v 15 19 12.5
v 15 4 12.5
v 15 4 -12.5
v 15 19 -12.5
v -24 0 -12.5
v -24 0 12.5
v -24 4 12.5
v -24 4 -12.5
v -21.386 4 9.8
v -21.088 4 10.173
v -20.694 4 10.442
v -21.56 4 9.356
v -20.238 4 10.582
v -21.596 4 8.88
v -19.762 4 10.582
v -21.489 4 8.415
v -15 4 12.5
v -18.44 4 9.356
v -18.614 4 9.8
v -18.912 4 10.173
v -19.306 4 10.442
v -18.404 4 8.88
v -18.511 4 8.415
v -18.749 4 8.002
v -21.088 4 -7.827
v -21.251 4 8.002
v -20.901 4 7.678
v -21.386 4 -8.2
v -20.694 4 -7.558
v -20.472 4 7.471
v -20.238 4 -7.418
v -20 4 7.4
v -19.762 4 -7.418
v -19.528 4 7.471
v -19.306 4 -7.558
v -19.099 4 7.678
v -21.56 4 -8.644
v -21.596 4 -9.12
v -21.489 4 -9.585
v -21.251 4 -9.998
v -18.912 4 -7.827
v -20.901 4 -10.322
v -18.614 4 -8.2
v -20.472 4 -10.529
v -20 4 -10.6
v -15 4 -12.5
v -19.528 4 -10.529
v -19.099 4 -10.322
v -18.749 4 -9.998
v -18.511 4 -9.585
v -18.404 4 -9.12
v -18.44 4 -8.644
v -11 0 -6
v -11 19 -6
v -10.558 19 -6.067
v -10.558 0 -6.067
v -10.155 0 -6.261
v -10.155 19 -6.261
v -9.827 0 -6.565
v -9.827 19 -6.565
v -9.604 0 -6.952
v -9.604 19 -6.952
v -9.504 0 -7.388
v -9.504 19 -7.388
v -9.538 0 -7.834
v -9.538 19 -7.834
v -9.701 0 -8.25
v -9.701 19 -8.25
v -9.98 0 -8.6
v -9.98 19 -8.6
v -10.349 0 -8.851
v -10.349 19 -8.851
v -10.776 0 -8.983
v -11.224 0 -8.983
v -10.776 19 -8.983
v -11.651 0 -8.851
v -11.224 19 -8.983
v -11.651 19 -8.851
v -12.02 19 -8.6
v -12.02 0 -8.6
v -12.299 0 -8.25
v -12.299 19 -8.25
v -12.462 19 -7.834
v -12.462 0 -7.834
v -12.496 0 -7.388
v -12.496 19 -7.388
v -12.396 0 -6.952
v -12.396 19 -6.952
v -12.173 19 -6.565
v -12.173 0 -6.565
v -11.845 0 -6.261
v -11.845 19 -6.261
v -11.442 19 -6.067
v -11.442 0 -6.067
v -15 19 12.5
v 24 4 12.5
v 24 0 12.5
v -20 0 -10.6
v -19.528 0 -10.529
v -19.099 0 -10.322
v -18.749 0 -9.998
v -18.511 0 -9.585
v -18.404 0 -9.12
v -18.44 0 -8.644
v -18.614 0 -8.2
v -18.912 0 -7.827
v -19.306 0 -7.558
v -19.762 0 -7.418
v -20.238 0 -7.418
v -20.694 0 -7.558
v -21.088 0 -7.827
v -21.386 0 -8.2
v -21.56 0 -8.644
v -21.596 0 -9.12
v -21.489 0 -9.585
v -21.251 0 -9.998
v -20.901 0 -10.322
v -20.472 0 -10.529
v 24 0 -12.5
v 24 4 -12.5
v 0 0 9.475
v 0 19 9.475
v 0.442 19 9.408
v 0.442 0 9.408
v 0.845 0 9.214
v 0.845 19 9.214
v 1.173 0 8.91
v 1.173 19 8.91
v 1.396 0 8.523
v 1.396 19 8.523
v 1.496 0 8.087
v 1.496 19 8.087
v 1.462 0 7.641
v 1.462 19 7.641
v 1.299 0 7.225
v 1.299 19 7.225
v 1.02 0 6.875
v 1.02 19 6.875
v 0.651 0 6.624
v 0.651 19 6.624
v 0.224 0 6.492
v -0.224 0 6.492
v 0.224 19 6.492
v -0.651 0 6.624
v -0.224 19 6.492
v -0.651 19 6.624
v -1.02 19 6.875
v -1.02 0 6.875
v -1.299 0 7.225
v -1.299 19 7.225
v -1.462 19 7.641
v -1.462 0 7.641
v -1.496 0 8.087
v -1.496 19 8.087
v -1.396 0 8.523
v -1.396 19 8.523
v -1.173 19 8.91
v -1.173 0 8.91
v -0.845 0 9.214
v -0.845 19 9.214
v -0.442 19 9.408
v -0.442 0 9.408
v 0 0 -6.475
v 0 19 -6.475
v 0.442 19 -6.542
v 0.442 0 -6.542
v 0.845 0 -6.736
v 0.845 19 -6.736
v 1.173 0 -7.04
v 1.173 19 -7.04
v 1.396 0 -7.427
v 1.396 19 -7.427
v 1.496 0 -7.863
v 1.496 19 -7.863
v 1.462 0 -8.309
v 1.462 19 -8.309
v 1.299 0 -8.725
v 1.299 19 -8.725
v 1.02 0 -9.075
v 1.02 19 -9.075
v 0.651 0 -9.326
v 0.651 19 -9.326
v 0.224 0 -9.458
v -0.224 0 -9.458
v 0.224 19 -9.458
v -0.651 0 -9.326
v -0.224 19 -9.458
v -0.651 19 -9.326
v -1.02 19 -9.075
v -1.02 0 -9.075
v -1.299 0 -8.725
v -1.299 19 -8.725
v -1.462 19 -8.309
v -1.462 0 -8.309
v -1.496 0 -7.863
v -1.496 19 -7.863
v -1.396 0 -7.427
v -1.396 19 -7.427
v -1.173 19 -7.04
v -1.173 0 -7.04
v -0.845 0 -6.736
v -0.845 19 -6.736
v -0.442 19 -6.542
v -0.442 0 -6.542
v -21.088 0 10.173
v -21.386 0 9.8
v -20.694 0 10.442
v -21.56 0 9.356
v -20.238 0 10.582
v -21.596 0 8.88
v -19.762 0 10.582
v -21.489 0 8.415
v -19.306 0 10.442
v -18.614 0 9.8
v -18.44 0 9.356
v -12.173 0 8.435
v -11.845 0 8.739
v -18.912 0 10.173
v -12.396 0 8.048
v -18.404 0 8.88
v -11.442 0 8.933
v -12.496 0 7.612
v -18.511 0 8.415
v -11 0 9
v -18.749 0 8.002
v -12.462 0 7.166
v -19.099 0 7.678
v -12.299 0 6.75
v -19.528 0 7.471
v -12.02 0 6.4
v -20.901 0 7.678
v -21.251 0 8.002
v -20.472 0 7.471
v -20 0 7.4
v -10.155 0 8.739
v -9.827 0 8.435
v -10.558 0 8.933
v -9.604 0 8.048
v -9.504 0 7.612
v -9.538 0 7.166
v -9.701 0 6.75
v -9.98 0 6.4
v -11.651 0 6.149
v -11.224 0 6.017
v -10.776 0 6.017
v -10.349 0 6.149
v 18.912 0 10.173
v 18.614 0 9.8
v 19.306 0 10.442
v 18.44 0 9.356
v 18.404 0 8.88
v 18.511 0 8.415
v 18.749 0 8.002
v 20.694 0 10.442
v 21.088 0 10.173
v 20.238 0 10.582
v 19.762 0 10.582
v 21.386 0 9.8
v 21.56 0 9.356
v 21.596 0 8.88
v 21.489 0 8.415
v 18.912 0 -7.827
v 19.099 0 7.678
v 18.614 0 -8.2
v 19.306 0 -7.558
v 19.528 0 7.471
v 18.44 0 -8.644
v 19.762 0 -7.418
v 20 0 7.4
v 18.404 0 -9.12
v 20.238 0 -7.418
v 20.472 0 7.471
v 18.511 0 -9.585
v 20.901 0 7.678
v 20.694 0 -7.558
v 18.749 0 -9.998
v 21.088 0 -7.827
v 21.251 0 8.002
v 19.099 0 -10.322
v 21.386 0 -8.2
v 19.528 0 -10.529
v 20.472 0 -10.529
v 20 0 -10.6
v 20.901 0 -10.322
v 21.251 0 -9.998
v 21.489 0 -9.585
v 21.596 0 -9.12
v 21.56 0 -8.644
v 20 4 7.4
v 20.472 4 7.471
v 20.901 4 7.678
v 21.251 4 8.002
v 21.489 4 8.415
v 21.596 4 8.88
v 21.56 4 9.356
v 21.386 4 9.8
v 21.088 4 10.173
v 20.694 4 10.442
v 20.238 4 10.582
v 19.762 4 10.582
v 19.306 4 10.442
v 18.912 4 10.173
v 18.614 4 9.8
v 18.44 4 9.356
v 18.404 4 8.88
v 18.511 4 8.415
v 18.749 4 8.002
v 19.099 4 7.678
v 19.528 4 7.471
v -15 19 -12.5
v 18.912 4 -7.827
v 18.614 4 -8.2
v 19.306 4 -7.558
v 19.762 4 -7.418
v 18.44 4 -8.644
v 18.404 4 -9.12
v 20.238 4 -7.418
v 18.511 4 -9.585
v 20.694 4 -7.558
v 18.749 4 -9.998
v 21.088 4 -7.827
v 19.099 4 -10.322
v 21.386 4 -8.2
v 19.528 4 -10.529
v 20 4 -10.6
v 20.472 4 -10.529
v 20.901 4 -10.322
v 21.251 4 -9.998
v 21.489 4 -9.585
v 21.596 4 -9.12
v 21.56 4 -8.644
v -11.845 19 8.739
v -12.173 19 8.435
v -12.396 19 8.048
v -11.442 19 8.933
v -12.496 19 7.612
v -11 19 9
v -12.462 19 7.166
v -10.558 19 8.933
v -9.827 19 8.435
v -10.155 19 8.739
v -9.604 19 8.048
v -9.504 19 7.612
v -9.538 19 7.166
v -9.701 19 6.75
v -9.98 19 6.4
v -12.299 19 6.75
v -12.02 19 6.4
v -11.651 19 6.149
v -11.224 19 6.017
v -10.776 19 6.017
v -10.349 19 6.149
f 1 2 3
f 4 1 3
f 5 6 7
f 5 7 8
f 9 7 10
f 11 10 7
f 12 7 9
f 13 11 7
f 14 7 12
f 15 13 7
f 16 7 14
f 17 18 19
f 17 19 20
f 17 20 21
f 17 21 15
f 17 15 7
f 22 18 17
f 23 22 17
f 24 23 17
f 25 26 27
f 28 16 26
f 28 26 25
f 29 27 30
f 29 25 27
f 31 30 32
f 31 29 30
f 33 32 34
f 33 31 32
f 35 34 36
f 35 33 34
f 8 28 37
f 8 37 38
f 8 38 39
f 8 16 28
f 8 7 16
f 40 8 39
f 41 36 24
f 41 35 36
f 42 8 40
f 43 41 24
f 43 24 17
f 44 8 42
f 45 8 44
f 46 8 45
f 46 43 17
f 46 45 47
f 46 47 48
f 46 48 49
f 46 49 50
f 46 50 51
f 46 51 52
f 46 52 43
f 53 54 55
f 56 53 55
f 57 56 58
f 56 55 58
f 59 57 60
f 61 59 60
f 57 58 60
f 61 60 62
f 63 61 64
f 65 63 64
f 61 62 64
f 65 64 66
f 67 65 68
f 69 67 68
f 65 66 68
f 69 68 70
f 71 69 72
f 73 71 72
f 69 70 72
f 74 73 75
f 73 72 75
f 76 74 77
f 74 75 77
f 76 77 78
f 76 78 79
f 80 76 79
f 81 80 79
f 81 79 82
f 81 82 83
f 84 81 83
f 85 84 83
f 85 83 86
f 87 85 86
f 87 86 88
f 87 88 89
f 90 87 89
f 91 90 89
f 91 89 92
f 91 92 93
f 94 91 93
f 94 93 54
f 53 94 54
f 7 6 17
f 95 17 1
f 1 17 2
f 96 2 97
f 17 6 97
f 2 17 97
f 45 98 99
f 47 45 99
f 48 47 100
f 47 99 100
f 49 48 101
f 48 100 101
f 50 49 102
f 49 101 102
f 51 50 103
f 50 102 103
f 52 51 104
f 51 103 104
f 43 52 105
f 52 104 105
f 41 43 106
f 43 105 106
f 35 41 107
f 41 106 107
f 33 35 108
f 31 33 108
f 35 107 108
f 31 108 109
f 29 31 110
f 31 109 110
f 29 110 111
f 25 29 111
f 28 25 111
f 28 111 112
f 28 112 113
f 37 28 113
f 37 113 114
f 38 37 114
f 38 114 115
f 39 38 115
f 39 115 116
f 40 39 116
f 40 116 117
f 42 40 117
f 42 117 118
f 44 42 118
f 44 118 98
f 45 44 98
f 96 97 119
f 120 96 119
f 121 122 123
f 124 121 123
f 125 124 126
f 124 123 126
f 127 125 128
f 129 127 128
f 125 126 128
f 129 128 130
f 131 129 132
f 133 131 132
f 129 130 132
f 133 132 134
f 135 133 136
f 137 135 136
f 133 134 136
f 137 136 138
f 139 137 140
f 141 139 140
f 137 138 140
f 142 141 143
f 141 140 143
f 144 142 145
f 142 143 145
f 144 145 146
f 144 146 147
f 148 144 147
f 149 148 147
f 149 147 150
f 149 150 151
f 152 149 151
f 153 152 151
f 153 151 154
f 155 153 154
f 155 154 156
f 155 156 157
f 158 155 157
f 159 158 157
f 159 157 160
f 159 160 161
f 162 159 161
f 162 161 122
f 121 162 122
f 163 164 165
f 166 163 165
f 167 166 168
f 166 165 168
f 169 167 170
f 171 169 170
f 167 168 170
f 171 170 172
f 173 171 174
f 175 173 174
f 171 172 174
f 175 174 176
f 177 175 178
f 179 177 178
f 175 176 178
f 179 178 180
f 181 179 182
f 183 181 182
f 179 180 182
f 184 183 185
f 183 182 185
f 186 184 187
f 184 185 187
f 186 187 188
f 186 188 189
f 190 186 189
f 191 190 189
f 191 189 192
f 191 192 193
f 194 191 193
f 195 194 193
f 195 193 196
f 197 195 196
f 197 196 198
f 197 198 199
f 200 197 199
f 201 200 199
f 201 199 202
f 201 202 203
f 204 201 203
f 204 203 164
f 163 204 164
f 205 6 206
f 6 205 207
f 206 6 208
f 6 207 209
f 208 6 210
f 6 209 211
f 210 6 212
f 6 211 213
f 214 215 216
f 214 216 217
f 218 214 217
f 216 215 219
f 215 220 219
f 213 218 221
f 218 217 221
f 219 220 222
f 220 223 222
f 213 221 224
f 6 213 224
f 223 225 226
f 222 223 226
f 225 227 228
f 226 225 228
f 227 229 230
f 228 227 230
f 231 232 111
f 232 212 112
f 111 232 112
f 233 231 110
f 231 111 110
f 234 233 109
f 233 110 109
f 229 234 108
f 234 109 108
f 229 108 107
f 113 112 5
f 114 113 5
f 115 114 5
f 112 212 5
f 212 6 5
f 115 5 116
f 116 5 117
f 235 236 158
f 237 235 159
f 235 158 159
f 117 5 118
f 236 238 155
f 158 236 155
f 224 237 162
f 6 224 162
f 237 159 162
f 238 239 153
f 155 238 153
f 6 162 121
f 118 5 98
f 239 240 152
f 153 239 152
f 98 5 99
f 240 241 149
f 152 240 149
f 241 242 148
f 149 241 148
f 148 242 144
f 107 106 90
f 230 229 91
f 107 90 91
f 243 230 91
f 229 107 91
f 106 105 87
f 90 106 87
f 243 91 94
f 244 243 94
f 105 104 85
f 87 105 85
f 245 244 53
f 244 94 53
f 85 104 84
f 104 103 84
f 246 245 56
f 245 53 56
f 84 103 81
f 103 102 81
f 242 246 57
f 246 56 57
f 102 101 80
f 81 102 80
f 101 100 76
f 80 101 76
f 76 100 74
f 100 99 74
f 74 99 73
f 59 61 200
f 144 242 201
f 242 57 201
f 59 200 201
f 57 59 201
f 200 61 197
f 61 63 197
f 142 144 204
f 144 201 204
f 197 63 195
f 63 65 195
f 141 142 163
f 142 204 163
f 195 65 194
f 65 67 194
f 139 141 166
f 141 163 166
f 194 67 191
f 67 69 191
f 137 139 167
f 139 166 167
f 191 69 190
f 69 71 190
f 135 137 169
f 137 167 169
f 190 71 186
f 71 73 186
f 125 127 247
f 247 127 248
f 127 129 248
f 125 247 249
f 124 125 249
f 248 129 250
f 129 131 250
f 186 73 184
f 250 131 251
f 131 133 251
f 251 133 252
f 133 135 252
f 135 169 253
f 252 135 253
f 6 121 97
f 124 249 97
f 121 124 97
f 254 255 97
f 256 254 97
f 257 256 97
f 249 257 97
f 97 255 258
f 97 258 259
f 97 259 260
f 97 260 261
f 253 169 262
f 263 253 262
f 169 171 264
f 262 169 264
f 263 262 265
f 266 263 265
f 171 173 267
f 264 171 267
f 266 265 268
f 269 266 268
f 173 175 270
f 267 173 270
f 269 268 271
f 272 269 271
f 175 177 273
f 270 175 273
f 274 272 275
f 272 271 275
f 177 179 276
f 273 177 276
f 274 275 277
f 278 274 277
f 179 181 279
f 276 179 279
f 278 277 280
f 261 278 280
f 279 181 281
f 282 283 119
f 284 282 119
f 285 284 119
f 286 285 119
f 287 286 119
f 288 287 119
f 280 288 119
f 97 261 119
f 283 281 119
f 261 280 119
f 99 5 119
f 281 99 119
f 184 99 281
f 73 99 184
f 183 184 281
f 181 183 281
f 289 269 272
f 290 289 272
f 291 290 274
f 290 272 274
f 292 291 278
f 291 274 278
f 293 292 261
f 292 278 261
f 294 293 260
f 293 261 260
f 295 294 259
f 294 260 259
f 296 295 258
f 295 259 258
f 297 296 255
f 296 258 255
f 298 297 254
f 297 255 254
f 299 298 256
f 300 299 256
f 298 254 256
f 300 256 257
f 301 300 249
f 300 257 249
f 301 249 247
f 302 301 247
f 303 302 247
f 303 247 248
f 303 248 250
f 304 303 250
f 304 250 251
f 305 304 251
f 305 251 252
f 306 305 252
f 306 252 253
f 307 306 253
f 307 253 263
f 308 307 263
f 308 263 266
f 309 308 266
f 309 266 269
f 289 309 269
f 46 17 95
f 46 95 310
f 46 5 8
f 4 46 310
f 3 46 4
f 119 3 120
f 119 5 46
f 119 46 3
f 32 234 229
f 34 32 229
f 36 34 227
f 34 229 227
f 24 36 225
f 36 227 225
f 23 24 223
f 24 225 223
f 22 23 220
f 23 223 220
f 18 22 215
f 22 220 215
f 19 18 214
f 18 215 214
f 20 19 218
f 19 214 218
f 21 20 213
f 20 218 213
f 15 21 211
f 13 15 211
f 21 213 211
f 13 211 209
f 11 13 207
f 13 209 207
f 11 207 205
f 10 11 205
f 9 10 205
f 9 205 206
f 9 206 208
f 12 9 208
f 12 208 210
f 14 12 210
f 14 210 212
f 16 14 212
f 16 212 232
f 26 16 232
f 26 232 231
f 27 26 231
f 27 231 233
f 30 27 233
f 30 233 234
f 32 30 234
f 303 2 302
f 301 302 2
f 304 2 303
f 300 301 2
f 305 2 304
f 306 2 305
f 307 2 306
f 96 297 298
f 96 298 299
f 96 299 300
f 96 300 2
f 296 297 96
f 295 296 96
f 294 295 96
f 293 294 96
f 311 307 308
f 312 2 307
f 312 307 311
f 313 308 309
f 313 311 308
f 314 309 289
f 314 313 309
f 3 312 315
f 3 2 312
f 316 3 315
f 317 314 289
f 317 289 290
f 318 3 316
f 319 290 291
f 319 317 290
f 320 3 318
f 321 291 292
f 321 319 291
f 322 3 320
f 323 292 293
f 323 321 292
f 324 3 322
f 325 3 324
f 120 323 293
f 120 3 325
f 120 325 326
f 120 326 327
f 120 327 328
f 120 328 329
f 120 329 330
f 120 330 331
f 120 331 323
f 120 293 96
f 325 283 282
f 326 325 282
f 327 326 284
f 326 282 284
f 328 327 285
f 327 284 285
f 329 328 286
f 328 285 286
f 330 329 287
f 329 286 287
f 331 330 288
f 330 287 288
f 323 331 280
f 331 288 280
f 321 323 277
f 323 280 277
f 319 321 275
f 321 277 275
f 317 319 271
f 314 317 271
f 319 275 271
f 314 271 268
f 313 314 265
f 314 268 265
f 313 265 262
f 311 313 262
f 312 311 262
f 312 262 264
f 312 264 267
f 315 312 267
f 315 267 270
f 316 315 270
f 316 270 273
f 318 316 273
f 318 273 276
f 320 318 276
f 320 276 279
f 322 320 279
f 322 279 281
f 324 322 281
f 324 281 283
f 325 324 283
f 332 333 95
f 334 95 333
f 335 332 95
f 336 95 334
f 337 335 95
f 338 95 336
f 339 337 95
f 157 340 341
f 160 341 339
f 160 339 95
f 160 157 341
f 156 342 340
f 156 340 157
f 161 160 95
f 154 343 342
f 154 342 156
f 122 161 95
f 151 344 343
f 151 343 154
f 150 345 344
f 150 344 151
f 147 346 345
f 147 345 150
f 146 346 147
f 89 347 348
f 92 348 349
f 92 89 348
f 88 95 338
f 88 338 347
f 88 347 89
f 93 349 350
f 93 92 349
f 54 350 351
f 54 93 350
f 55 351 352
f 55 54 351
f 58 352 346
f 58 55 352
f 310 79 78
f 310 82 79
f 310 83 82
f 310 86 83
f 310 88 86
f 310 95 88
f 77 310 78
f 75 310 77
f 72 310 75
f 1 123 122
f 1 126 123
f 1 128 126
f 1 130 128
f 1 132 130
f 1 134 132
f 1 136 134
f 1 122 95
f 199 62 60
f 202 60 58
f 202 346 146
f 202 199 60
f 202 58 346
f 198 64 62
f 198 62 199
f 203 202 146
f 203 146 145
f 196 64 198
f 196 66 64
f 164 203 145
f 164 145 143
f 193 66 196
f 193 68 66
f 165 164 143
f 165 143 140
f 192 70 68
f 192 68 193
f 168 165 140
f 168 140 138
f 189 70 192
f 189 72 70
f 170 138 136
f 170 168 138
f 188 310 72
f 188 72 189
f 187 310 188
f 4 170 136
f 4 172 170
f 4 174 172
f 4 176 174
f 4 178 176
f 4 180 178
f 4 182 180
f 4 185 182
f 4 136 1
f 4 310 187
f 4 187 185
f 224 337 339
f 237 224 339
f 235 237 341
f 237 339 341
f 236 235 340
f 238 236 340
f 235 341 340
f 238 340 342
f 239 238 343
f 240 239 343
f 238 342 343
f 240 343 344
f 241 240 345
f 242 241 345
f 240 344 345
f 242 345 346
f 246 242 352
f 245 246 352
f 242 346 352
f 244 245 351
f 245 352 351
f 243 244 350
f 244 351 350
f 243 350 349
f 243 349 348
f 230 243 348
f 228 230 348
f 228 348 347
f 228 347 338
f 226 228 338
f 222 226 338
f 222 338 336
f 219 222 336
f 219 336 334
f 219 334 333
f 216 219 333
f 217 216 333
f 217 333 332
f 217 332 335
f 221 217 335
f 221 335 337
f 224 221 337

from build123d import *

# Parameters (mm, degrees)
SKETCH1_W           = 48
SKETCH1_H           = 25
BOSS_EXTRUDE1_DEPTH = 4
SKETCH2_W           = 30
SKETCH2_H           = 25
BOSS_EXTRUDE2_DEPTH = 15
SKETCH3_R           = 1.5
CUT_EXTRUDE1_DEPTH  = 20
SKETCH4_R           = 1.6
CUT_EXTRUDE2_DEPTH  = 20


with BuildPart() as part:
    # Sketch1 → Boss-Extrude1 (new body)
    with BuildSketch(Plane(origin=(0, 0, 0), x_dir=(1, 0, 0), z_dir=(0, 1, 0))):
        Rectangle(SKETCH1_W, SKETCH1_H)
    extrude(amount=BOSS_EXTRUDE1_DEPTH)

    # Sketch2 → Boss-Extrude2 (add)
    with BuildSketch(Plane(origin=(0, 4, 0), x_dir=(1, 0, 0), z_dir=(0, 1, 0))):
        Rectangle(SKETCH2_W, SKETCH2_H)
    extrude(amount=BOSS_EXTRUDE2_DEPTH)

    # Sketch3 → Cut-Extrude1 (cut, through all)
    with BuildSketch(Plane(origin=(0, 19, 0), x_dir=(1, 0, 0), z_dir=(0, 1, 0))):
        with Locations(Location((0, 7.975, 0), (0, 0, 270))):  # turned: the seam where the file's is
            Circle(SKETCH3_R)
        with Locations(Location((0, -7.975, 0), (0, 0, 270))):  # turned: the seam where the file's is
            Circle(SKETCH3_R)
        with Locations(Location((-11, 7.5, 0), (0, 0, 270))):  # turned: the seam where the file's is
            Circle(SKETCH3_R)
        with Locations(Location((-11, -7.5, 0), (0, 0, 270))):  # turned: the seam where the file's is
            Circle(SKETCH3_R)
    extrude(amount=-CUT_EXTRUDE1_DEPTH, mode=Mode.SUBTRACT)

    # Sketch4 → Cut-Extrude2 (cut, through all)
    with BuildSketch(Plane.XZ):
        with Locations(Location((-20, 9, 0), (0, 0, 270))):  # turned: the seam where the file's is
            Circle(SKETCH4_R)
        with Locations(Location((20, 9, 0), (0, 0, 270))):  # turned: the seam where the file's is
            Circle(SKETCH4_R)
        with Locations(Location((20, -9, 0), (0, 0, 270))):  # turned: the seam where the file's is
            Circle(SKETCH4_R)
        with Locations(Location((-20, -9, 0), (0, 0, 270))):  # turned: the seam where the file's is
            Circle(SKETCH4_R)
    extrude(amount=-CUT_EXTRUDE2_DEPTH, mode=Mode.SUBTRACT)


solid = part.part
